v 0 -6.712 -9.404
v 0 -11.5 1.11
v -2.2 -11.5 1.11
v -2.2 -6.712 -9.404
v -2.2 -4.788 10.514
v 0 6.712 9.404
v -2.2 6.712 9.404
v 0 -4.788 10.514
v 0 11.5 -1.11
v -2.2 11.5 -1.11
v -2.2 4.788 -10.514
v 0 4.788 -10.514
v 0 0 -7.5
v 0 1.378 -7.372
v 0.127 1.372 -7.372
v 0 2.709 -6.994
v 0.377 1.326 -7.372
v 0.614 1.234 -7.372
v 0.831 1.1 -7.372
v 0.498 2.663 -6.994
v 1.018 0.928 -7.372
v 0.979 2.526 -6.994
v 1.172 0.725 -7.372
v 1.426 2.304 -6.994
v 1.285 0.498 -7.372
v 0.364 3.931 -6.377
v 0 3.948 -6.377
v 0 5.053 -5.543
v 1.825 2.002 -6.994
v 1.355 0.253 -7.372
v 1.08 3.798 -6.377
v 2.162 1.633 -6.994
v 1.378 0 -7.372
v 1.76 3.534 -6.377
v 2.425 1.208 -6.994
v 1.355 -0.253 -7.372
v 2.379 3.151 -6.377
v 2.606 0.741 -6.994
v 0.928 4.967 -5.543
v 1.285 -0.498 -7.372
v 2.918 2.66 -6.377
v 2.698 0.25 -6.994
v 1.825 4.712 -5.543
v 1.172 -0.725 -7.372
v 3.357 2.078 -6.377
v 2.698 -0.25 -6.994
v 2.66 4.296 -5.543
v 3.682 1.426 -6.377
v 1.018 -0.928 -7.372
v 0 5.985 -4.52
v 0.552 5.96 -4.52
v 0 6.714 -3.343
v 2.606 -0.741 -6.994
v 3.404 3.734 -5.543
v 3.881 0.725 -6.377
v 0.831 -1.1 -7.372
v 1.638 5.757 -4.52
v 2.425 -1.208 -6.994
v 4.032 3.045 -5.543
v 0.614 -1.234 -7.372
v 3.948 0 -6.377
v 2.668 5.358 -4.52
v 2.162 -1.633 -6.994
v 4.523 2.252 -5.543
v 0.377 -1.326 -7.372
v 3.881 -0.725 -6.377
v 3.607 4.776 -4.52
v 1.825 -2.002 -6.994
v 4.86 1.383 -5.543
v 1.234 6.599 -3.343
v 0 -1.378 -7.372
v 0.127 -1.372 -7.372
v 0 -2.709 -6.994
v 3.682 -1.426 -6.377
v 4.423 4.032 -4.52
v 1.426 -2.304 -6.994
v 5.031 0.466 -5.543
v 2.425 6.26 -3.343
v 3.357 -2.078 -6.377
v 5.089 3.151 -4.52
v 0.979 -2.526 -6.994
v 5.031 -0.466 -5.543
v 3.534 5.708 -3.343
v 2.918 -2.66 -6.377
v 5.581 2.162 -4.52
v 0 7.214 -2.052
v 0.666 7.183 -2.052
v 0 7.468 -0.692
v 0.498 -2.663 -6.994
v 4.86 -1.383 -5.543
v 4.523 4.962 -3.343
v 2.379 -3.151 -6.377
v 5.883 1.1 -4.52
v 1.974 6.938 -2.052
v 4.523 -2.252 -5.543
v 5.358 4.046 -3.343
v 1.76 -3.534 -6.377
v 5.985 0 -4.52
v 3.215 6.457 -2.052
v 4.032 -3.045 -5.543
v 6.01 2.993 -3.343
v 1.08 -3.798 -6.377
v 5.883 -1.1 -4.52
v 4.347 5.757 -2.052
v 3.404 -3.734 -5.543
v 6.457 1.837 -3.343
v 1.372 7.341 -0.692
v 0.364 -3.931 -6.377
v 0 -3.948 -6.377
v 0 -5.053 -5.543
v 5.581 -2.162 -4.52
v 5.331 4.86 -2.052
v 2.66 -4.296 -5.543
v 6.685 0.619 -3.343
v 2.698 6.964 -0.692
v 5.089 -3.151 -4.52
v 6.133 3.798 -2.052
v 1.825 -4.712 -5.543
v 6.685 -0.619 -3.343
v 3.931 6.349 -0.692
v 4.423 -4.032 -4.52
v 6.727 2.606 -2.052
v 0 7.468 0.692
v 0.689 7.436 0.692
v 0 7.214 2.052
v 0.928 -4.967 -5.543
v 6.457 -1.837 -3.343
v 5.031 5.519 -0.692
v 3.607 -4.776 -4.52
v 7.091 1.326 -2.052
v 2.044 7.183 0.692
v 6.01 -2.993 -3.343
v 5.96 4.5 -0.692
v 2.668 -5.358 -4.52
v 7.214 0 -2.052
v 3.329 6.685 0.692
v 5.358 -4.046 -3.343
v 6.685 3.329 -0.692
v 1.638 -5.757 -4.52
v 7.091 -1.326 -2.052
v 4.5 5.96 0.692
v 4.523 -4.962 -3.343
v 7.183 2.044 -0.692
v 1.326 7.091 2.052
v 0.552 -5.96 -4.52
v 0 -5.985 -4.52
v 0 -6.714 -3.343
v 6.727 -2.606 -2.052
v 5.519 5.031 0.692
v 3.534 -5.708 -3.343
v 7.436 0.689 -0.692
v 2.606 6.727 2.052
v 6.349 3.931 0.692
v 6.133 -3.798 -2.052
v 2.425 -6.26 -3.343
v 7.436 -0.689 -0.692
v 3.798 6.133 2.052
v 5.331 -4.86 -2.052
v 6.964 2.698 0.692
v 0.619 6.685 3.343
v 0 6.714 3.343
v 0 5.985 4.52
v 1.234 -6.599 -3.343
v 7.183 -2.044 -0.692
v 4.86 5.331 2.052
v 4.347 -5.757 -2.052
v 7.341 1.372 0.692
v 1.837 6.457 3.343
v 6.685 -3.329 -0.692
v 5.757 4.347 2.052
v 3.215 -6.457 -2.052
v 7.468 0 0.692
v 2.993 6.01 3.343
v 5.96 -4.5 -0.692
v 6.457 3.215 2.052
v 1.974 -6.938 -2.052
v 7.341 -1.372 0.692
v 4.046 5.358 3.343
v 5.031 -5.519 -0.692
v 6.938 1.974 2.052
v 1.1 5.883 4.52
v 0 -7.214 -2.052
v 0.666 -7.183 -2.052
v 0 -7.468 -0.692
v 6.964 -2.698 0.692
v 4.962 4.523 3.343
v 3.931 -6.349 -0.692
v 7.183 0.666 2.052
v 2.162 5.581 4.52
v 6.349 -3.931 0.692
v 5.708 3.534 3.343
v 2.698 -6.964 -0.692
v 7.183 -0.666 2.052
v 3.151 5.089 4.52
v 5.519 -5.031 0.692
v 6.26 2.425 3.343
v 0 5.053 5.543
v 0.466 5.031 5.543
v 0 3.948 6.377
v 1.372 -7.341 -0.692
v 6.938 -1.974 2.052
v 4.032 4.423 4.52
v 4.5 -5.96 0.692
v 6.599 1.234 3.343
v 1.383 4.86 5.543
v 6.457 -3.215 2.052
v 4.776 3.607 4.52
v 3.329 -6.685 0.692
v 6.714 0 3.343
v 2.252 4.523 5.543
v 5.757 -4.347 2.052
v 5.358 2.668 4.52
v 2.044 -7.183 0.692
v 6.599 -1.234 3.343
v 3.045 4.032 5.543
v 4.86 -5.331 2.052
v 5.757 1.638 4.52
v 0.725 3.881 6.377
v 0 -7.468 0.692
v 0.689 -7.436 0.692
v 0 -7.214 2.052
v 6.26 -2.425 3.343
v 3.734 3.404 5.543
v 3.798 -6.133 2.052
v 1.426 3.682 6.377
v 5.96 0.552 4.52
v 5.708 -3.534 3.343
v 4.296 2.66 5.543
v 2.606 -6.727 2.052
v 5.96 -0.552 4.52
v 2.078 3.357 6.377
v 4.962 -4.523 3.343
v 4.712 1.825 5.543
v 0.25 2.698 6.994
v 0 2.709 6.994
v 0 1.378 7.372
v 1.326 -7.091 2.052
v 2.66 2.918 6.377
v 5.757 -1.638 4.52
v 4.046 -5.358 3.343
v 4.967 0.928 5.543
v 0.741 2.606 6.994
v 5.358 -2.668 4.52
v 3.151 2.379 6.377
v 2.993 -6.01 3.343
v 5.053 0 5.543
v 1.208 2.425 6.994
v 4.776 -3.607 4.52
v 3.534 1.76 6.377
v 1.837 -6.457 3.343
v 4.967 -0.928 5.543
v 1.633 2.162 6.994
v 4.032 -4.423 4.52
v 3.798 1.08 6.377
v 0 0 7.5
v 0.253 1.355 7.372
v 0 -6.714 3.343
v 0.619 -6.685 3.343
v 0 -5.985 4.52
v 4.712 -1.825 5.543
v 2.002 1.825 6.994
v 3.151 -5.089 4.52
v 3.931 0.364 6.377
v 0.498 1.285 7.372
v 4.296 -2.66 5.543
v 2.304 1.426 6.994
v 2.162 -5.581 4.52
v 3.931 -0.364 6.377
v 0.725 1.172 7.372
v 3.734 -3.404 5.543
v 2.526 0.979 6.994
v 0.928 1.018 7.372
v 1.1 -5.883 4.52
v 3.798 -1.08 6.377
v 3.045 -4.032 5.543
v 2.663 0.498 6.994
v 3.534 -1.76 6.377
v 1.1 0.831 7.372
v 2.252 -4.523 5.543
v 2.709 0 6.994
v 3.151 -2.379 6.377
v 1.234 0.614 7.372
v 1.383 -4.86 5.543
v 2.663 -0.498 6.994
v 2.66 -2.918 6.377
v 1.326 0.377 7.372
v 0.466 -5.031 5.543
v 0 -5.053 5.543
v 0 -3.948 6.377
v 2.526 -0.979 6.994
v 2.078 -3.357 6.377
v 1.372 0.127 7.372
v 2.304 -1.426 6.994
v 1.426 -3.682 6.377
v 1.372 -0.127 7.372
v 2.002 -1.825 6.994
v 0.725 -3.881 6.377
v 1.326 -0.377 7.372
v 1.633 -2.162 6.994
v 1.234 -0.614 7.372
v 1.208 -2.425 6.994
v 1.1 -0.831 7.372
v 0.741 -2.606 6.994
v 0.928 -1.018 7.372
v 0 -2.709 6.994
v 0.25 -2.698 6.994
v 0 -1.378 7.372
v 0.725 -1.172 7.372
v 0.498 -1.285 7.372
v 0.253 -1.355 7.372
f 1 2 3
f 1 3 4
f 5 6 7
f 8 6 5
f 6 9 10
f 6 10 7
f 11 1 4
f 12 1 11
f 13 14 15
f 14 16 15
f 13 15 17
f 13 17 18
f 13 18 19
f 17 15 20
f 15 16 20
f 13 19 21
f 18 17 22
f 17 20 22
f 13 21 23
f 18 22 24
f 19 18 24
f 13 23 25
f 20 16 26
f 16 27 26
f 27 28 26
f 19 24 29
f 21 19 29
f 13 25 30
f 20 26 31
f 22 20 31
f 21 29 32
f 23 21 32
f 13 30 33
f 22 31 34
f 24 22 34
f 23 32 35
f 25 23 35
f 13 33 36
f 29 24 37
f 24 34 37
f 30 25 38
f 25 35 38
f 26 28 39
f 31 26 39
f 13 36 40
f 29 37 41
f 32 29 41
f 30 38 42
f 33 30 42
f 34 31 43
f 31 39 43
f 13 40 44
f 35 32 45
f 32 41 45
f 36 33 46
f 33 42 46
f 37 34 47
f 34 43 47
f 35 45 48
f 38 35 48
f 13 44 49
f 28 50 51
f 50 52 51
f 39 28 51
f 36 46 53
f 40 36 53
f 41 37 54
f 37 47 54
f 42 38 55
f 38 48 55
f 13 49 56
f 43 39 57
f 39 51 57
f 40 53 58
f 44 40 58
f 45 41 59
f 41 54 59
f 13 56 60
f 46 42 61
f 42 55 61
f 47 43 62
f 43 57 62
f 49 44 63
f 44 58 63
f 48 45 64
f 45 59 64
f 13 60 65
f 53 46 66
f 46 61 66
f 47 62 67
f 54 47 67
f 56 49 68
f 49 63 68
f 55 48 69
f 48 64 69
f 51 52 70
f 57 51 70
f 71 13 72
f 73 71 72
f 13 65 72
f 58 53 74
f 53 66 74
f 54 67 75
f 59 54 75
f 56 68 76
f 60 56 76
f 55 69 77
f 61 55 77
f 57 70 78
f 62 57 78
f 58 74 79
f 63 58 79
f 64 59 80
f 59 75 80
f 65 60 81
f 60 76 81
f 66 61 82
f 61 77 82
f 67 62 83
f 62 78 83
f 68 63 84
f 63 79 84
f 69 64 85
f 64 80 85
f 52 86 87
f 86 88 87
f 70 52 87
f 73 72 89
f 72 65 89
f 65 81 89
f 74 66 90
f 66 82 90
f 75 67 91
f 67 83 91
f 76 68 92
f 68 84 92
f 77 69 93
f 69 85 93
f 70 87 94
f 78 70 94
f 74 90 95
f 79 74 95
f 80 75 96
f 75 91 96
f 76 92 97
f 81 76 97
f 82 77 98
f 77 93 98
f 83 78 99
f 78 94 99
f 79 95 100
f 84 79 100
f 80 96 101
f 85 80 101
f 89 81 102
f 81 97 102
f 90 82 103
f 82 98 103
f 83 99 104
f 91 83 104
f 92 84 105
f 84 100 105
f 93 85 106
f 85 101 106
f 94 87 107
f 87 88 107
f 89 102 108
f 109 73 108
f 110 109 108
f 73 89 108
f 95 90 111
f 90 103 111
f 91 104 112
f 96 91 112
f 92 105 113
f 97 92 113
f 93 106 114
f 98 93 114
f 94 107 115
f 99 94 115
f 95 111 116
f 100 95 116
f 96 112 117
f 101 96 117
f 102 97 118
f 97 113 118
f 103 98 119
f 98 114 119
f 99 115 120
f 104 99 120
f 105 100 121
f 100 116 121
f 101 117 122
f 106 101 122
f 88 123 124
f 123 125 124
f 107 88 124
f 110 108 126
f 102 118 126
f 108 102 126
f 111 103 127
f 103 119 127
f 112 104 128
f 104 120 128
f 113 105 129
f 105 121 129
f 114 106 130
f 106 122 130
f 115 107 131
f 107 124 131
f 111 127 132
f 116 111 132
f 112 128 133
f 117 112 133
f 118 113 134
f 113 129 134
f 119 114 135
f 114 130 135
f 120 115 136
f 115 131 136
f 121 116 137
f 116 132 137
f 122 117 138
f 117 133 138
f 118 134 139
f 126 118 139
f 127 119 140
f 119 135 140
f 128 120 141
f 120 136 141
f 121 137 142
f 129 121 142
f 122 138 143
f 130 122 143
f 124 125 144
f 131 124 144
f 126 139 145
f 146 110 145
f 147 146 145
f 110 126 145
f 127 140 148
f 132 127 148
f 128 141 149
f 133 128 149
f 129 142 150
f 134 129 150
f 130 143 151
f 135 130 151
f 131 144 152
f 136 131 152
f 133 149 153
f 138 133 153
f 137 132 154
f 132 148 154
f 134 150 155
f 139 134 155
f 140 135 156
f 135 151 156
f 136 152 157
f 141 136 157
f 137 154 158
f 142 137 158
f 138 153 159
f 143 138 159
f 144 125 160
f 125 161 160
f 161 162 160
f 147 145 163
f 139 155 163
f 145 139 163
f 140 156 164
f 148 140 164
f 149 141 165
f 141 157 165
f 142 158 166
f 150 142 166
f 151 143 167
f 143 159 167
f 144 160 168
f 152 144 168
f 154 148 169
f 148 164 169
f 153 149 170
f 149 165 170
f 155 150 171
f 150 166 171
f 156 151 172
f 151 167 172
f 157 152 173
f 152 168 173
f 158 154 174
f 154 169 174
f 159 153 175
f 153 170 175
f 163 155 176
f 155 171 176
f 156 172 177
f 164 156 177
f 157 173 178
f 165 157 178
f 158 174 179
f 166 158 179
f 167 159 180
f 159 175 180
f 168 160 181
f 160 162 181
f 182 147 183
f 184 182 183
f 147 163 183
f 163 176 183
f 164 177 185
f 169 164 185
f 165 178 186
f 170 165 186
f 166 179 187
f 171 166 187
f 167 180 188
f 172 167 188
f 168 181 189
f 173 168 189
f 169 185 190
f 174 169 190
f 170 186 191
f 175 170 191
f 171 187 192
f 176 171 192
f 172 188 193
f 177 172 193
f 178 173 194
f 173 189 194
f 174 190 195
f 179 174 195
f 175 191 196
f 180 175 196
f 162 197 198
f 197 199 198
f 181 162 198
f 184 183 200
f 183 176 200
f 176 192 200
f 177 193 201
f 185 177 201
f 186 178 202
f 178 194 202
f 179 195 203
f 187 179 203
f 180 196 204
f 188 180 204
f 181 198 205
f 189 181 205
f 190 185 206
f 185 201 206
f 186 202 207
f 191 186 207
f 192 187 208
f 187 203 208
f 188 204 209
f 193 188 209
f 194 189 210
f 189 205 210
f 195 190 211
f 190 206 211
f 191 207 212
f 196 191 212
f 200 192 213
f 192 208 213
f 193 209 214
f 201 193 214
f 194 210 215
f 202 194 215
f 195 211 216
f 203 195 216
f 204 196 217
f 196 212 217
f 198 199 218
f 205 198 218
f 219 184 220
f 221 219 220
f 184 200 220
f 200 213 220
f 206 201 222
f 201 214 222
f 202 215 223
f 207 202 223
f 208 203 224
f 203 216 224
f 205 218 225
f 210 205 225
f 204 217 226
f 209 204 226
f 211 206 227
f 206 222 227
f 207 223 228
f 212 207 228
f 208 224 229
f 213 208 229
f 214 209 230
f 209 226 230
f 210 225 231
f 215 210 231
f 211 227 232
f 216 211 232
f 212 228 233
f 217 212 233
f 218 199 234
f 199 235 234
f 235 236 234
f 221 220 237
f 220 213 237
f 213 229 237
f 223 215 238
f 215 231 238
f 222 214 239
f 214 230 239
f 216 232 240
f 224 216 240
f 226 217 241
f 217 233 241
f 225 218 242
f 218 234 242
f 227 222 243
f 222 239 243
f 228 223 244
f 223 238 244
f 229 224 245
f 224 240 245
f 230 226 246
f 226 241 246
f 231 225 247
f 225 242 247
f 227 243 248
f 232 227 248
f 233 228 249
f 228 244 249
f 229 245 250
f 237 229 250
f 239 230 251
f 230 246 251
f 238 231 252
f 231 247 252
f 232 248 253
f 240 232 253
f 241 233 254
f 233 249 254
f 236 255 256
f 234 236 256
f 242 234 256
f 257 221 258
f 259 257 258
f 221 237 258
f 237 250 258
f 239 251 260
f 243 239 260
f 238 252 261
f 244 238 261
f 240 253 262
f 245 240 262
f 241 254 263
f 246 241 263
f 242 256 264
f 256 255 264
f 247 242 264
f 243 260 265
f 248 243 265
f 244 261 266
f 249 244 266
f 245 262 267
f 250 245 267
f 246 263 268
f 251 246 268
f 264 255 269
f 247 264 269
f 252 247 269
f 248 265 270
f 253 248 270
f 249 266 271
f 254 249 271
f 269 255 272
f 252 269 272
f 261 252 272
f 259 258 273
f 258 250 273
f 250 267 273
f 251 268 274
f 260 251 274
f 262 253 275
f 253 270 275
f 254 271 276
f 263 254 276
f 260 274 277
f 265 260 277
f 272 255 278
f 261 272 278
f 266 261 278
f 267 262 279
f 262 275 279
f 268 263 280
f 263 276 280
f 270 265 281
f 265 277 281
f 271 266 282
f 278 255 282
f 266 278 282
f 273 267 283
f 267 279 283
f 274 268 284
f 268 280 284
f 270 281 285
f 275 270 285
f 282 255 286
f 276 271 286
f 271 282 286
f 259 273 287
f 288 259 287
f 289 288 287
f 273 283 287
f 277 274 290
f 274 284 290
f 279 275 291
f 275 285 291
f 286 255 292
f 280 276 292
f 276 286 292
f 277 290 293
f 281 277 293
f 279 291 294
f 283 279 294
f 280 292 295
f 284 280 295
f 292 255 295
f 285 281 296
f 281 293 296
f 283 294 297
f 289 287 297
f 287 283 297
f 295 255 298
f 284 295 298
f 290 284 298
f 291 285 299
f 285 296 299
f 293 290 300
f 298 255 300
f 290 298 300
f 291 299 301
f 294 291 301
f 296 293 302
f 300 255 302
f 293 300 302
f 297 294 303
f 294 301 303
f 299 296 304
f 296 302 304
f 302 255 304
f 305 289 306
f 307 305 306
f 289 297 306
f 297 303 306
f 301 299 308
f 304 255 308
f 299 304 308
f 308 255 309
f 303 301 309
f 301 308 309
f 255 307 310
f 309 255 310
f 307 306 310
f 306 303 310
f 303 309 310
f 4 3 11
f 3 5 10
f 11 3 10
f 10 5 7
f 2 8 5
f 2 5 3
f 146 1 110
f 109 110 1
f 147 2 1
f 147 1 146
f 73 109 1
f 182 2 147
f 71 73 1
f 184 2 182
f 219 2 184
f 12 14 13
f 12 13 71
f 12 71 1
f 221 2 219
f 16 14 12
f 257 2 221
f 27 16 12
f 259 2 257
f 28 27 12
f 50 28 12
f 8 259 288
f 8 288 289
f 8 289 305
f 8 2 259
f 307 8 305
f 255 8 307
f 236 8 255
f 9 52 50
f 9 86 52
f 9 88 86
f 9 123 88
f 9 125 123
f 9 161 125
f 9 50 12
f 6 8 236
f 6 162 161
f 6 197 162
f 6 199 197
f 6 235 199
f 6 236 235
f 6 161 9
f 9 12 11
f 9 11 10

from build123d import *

# Parameters (mm, degrees)
F1_ANGLE = 180
F3_DEPTH = 2.2


with BuildPart() as f1:
    # F0 (on Right) → F1 (revolve)
    with BuildSketch(Plane.YZ):
        with BuildLine():
            ThreePointArc((0, -7.5), (7.5, 0), (0, 7.5))
            Line((0, 7.5), (0, -7.5))
        make_face()
    revolve(axis=Axis((0, 0, 0), (0, 0, -1)), revolution_arc=F1_ANGLE)

    # F2 (on Right) → F3 (join)
    with BuildSketch(Plane.YZ):
        Polygon((-4.788409, 10.514467), (-11.5, 1.110349), (-6.711591, -9.404118), (4.788409, -10.514467), (11.5, -1.110349), (6.711591, 9.404118), align=None)
    extrude(amount=-F3_DEPTH)


solid = f1.part
